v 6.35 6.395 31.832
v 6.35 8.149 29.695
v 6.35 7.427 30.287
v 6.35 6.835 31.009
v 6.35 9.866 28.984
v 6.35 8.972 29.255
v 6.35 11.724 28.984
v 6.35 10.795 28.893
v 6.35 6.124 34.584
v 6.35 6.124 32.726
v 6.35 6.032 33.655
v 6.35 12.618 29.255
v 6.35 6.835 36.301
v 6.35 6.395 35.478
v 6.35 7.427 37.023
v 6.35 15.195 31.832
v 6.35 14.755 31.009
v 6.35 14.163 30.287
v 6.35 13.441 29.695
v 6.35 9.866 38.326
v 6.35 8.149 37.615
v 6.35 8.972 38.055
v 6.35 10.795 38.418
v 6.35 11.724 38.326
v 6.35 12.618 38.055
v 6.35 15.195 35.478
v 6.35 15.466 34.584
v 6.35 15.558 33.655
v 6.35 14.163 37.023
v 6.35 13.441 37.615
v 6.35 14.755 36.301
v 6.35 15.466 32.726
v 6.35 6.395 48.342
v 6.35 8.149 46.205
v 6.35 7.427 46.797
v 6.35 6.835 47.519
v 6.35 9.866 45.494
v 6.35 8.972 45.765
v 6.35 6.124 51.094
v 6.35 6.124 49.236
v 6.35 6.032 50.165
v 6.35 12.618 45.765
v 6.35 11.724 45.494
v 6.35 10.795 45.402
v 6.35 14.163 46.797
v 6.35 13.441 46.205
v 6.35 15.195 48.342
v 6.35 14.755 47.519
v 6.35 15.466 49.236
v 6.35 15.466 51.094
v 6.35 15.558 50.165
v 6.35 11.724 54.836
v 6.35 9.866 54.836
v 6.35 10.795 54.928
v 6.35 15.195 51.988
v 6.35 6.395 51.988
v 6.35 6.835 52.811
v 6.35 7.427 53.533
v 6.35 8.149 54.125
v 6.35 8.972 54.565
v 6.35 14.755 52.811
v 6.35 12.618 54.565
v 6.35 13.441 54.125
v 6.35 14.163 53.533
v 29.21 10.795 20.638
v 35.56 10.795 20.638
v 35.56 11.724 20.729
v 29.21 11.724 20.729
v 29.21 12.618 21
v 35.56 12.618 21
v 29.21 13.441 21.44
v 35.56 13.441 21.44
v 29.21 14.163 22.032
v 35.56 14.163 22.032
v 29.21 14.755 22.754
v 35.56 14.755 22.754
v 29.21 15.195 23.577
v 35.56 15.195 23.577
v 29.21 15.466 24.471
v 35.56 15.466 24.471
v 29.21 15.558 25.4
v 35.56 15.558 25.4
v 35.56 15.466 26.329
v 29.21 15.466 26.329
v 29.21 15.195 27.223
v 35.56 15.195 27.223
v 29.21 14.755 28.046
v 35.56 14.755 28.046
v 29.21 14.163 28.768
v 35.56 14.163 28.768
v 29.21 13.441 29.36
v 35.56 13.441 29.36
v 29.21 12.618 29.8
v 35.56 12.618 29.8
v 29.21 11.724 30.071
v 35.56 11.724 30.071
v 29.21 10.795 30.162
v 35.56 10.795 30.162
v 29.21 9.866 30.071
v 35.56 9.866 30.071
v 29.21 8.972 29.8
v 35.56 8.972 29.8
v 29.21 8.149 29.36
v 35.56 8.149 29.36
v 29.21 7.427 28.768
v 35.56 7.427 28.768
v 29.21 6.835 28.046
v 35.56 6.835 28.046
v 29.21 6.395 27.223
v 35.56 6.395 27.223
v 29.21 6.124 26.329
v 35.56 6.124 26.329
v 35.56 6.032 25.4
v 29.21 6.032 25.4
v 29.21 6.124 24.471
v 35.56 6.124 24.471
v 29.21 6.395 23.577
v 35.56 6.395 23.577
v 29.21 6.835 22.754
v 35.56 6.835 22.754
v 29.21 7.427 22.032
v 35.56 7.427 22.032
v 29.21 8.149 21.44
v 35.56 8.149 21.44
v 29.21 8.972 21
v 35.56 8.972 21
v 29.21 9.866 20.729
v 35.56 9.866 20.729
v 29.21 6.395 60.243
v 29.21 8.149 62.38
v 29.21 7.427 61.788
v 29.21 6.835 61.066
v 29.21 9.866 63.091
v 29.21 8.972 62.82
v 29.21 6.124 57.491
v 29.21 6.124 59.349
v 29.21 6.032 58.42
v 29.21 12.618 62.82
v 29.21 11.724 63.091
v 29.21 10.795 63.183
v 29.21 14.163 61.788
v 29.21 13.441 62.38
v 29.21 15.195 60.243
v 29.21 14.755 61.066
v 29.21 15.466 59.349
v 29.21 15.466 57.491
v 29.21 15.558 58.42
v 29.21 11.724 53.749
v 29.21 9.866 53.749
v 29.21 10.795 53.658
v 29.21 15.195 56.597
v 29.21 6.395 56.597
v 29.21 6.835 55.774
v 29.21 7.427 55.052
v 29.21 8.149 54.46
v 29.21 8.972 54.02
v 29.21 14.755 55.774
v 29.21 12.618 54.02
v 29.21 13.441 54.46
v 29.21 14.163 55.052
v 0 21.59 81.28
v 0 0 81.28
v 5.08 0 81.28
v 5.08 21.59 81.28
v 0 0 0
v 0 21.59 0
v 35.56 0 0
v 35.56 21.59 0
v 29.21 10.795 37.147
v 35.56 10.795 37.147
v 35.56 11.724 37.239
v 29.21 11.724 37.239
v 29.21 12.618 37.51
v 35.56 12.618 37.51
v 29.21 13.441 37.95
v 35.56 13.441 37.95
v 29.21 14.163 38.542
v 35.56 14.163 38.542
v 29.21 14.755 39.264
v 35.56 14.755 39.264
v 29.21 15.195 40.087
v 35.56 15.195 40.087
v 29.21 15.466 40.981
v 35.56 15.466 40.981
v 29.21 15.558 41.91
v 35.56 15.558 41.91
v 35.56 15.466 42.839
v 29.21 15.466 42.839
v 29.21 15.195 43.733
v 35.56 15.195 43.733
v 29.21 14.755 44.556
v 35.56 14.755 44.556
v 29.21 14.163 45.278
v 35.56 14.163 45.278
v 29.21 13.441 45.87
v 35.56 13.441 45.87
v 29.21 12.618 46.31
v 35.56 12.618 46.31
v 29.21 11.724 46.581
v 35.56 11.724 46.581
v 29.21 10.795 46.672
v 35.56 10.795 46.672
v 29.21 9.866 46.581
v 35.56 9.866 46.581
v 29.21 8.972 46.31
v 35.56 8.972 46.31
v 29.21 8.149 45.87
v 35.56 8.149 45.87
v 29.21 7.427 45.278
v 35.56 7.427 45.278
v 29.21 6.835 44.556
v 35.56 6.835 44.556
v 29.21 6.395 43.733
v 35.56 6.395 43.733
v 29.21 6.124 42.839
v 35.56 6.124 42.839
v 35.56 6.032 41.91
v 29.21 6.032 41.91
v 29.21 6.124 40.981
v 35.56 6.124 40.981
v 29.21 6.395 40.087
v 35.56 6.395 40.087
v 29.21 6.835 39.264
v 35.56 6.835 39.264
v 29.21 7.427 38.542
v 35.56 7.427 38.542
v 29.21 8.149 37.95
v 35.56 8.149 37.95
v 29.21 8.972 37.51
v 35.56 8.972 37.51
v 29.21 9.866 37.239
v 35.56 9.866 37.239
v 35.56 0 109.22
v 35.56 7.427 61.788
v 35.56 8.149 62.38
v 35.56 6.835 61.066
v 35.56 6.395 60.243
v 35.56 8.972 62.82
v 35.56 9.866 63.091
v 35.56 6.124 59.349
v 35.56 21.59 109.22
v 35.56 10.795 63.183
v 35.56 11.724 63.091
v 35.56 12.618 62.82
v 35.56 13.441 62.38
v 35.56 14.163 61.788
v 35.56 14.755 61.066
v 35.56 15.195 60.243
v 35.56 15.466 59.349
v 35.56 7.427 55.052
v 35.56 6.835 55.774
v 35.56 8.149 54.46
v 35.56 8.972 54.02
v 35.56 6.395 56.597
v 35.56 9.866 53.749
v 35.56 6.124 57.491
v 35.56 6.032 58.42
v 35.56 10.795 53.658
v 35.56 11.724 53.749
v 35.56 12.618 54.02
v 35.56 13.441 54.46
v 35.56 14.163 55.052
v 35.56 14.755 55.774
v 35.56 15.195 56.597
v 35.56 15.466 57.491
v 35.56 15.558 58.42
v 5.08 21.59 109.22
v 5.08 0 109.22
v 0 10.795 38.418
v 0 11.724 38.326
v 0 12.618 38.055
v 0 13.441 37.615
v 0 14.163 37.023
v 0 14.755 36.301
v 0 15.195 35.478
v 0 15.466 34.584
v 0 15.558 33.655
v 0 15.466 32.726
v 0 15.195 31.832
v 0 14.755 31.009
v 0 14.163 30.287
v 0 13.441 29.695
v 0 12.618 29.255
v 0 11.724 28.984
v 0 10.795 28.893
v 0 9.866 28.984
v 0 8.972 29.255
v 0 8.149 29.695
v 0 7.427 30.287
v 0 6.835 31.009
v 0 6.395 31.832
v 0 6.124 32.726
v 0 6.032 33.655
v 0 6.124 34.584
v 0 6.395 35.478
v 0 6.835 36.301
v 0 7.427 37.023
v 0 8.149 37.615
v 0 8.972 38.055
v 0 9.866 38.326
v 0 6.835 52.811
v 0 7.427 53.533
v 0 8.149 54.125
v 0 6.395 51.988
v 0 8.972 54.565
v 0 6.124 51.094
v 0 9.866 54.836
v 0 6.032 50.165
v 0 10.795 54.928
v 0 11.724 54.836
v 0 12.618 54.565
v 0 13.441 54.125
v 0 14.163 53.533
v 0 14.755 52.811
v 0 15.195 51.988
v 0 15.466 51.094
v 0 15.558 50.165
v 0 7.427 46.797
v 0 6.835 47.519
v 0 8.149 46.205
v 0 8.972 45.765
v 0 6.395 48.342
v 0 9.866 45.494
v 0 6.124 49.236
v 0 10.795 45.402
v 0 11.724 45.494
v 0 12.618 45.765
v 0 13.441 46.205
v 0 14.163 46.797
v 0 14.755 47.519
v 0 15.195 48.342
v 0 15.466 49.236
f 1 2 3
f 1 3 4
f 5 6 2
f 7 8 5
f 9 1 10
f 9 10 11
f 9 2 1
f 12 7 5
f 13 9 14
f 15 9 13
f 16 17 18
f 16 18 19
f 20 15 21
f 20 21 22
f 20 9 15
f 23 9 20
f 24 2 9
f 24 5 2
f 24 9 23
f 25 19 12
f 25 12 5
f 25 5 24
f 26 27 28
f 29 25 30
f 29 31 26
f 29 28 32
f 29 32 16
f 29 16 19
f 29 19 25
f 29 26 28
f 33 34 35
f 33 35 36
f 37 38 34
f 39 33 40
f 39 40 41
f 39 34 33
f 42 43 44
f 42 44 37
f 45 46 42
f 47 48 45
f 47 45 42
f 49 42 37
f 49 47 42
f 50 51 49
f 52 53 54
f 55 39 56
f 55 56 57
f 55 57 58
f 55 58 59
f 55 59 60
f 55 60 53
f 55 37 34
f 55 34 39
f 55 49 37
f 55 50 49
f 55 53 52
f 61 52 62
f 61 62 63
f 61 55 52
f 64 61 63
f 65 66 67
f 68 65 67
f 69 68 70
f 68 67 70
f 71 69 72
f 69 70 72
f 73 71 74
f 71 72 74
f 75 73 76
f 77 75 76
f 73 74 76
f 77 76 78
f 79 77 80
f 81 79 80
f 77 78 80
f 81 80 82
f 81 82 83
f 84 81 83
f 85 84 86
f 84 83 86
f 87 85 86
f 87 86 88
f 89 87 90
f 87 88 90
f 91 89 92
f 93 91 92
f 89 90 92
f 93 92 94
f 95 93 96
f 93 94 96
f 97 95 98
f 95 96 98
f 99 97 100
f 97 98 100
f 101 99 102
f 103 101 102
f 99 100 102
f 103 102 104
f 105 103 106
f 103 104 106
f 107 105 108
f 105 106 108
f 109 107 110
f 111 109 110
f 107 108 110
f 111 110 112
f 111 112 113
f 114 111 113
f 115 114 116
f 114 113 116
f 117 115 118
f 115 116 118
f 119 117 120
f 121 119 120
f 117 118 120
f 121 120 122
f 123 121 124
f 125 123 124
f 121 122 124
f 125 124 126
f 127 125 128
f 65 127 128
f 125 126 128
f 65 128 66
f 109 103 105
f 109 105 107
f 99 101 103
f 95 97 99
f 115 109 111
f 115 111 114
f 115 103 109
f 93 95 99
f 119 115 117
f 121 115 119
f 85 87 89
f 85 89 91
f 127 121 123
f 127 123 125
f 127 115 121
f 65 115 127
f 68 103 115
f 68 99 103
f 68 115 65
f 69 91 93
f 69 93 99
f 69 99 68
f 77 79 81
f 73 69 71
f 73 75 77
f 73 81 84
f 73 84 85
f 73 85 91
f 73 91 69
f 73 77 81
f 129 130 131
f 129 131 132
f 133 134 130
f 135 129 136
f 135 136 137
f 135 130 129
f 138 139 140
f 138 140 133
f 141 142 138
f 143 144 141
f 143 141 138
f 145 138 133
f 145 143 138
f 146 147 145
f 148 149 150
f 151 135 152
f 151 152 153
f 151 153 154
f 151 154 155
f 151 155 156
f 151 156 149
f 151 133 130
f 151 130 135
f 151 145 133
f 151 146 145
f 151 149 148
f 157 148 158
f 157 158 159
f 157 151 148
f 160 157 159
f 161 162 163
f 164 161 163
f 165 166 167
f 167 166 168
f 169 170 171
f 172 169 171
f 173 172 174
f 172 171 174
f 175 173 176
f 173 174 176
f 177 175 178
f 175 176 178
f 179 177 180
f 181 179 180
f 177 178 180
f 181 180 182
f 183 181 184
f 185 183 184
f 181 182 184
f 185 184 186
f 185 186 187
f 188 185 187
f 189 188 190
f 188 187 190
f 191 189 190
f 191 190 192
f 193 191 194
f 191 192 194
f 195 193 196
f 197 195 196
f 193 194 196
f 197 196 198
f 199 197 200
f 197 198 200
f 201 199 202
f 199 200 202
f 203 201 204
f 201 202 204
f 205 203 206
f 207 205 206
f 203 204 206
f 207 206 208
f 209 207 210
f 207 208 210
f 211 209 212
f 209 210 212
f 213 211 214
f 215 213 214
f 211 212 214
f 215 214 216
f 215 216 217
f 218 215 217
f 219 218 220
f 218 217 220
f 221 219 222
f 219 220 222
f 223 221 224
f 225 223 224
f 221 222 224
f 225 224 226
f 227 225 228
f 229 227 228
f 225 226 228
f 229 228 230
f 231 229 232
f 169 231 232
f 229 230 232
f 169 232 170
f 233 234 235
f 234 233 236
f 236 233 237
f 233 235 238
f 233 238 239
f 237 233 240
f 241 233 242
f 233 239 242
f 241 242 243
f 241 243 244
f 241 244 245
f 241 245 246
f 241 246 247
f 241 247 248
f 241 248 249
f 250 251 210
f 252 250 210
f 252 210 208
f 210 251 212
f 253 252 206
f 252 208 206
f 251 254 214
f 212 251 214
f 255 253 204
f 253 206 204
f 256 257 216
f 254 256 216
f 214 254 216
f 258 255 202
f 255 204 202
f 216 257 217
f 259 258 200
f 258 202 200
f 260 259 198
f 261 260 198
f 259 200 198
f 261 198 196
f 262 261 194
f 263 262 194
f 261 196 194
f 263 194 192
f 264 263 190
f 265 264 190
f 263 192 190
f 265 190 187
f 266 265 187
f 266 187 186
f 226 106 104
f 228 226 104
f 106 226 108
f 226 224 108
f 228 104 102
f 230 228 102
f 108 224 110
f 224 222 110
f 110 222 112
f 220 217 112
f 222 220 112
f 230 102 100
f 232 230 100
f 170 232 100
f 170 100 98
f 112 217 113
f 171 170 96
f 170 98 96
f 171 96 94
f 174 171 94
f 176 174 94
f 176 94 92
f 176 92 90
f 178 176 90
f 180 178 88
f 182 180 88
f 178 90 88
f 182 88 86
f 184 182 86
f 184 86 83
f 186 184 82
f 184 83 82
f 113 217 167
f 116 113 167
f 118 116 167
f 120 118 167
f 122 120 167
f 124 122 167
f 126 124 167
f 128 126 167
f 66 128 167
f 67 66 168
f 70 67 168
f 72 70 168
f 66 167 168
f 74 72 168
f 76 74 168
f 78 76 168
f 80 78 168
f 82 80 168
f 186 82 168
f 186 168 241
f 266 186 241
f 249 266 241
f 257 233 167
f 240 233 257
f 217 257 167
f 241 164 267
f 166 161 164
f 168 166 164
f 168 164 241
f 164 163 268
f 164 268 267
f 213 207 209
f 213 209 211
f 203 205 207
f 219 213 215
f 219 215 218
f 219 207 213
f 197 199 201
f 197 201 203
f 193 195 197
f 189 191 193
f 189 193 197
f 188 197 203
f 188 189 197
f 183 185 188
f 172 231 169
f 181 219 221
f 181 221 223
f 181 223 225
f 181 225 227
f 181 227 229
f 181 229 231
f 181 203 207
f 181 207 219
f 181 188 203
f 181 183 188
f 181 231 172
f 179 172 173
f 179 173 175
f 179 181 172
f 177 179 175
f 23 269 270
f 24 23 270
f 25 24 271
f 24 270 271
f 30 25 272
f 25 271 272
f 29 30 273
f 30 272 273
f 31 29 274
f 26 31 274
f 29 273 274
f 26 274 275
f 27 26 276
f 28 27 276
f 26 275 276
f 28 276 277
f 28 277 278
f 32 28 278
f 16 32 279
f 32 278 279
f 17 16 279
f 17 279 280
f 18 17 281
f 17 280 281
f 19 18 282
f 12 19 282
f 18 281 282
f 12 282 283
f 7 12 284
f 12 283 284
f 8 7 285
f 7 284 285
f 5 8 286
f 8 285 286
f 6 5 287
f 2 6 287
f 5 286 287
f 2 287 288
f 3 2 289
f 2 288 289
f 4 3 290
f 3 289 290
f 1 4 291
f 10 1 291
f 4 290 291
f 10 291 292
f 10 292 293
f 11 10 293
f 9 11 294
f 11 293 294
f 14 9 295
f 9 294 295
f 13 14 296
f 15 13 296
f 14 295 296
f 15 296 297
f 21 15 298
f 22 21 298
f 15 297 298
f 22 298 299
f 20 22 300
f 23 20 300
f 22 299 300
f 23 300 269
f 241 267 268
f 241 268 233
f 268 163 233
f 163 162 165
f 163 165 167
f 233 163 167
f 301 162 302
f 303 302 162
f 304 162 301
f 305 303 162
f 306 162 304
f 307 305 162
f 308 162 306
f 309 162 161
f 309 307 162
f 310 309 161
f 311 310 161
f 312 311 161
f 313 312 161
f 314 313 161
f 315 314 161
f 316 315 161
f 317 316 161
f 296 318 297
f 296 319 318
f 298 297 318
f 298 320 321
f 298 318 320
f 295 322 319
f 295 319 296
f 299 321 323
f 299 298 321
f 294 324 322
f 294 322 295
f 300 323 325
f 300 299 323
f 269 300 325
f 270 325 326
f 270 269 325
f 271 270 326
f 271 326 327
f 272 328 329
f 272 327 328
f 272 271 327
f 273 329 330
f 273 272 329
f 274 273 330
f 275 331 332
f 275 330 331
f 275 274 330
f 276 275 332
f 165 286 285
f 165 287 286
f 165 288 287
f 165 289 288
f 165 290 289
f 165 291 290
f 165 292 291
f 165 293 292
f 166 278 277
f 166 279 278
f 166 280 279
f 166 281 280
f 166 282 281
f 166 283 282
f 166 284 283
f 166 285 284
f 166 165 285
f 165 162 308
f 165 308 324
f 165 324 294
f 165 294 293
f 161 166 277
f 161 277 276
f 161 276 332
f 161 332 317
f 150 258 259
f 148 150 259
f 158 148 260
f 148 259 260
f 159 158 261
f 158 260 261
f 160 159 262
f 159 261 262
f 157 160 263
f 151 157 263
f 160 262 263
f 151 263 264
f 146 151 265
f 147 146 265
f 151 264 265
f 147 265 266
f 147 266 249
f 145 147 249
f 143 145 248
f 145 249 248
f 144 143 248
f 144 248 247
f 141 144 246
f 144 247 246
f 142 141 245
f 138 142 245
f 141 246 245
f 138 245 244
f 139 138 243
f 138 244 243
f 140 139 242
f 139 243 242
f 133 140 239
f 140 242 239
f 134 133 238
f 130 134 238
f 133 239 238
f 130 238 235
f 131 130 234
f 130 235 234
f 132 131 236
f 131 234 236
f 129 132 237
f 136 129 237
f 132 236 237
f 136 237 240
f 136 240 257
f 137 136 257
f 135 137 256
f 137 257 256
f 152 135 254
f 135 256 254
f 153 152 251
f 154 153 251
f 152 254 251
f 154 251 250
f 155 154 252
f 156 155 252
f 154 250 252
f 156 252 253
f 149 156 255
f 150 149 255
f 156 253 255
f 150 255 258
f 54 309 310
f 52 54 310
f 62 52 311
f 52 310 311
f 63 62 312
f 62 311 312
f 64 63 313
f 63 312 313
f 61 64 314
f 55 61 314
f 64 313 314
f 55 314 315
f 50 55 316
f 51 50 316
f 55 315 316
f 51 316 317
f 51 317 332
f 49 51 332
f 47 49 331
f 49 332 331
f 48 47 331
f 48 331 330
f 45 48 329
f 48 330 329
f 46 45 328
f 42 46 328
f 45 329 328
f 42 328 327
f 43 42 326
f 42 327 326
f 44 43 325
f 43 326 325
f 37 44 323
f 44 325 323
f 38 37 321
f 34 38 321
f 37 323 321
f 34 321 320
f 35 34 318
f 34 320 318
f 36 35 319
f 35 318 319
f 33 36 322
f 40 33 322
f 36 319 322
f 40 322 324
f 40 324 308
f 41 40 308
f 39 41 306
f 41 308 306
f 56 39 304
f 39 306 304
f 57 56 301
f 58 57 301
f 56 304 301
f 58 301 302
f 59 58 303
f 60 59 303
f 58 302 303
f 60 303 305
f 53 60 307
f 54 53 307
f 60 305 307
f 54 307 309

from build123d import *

# Parameters (mm, degrees)
SKETCH1_W           = 35.56
SKETCH1_H           = 21.59
BOSS_EXTRUDE1_DEPTH = 81.28
SKETCH2_W           = 30.48
SKETCH2_H           = 21.59
BOSS_EXTRUDE2_DEPTH = 27.94
SKETCH3_R           = 4.7625
CUT_EXTRUDE1_DEPTH  = 6.35
SKETCH4_R           = 4.7625
CUT_EXTRUDE2_DEPTH  = 6.35


with BuildPart() as part:
    # Sketch1 → Boss-Extrude1 (new body)
    with BuildSketch(Plane.XY):
        with Locations((17.78, 10.795)):
            Rectangle(SKETCH1_W, SKETCH1_H)
    extrude(amount=BOSS_EXTRUDE1_DEPTH)

    # Sketch2 → Boss-Extrude2 (add)
    with BuildSketch(Plane.XY.offset(81.28)):
        with Locations((20.32, 10.795)):
            Rectangle(SKETCH2_W, SKETCH2_H)
    extrude(amount=BOSS_EXTRUDE2_DEPTH)

    # Sketch3 → Cut-Extrude1 (cut)
    with BuildSketch(Plane(origin=(35.56, 0, 0), x_dir=(0, 0, -1), z_dir=(1, 0, 0))):
        with Locations((-25.4, 10.795)):
            Circle(SKETCH3_R)
        with Locations((-41.91, 10.795)):
            Circle(SKETCH3_R)
        with Locations((-58.42, 10.795)):
            Circle(SKETCH3_R)
    extrude(amount=-CUT_EXTRUDE1_DEPTH, mode=Mode.SUBTRACT)

    # Sketch4 → Cut-Extrude2 (cut)
    with BuildSketch(Plane.ZY):
        with Locations((33.655, 10.795)):
            Circle(SKETCH4_R)
        with Locations((50.165, 10.795)):
            Circle(SKETCH4_R)
    extrude(amount=-CUT_EXTRUDE2_DEPTH, mode=Mode.SUBTRACT)


solid = part.part
